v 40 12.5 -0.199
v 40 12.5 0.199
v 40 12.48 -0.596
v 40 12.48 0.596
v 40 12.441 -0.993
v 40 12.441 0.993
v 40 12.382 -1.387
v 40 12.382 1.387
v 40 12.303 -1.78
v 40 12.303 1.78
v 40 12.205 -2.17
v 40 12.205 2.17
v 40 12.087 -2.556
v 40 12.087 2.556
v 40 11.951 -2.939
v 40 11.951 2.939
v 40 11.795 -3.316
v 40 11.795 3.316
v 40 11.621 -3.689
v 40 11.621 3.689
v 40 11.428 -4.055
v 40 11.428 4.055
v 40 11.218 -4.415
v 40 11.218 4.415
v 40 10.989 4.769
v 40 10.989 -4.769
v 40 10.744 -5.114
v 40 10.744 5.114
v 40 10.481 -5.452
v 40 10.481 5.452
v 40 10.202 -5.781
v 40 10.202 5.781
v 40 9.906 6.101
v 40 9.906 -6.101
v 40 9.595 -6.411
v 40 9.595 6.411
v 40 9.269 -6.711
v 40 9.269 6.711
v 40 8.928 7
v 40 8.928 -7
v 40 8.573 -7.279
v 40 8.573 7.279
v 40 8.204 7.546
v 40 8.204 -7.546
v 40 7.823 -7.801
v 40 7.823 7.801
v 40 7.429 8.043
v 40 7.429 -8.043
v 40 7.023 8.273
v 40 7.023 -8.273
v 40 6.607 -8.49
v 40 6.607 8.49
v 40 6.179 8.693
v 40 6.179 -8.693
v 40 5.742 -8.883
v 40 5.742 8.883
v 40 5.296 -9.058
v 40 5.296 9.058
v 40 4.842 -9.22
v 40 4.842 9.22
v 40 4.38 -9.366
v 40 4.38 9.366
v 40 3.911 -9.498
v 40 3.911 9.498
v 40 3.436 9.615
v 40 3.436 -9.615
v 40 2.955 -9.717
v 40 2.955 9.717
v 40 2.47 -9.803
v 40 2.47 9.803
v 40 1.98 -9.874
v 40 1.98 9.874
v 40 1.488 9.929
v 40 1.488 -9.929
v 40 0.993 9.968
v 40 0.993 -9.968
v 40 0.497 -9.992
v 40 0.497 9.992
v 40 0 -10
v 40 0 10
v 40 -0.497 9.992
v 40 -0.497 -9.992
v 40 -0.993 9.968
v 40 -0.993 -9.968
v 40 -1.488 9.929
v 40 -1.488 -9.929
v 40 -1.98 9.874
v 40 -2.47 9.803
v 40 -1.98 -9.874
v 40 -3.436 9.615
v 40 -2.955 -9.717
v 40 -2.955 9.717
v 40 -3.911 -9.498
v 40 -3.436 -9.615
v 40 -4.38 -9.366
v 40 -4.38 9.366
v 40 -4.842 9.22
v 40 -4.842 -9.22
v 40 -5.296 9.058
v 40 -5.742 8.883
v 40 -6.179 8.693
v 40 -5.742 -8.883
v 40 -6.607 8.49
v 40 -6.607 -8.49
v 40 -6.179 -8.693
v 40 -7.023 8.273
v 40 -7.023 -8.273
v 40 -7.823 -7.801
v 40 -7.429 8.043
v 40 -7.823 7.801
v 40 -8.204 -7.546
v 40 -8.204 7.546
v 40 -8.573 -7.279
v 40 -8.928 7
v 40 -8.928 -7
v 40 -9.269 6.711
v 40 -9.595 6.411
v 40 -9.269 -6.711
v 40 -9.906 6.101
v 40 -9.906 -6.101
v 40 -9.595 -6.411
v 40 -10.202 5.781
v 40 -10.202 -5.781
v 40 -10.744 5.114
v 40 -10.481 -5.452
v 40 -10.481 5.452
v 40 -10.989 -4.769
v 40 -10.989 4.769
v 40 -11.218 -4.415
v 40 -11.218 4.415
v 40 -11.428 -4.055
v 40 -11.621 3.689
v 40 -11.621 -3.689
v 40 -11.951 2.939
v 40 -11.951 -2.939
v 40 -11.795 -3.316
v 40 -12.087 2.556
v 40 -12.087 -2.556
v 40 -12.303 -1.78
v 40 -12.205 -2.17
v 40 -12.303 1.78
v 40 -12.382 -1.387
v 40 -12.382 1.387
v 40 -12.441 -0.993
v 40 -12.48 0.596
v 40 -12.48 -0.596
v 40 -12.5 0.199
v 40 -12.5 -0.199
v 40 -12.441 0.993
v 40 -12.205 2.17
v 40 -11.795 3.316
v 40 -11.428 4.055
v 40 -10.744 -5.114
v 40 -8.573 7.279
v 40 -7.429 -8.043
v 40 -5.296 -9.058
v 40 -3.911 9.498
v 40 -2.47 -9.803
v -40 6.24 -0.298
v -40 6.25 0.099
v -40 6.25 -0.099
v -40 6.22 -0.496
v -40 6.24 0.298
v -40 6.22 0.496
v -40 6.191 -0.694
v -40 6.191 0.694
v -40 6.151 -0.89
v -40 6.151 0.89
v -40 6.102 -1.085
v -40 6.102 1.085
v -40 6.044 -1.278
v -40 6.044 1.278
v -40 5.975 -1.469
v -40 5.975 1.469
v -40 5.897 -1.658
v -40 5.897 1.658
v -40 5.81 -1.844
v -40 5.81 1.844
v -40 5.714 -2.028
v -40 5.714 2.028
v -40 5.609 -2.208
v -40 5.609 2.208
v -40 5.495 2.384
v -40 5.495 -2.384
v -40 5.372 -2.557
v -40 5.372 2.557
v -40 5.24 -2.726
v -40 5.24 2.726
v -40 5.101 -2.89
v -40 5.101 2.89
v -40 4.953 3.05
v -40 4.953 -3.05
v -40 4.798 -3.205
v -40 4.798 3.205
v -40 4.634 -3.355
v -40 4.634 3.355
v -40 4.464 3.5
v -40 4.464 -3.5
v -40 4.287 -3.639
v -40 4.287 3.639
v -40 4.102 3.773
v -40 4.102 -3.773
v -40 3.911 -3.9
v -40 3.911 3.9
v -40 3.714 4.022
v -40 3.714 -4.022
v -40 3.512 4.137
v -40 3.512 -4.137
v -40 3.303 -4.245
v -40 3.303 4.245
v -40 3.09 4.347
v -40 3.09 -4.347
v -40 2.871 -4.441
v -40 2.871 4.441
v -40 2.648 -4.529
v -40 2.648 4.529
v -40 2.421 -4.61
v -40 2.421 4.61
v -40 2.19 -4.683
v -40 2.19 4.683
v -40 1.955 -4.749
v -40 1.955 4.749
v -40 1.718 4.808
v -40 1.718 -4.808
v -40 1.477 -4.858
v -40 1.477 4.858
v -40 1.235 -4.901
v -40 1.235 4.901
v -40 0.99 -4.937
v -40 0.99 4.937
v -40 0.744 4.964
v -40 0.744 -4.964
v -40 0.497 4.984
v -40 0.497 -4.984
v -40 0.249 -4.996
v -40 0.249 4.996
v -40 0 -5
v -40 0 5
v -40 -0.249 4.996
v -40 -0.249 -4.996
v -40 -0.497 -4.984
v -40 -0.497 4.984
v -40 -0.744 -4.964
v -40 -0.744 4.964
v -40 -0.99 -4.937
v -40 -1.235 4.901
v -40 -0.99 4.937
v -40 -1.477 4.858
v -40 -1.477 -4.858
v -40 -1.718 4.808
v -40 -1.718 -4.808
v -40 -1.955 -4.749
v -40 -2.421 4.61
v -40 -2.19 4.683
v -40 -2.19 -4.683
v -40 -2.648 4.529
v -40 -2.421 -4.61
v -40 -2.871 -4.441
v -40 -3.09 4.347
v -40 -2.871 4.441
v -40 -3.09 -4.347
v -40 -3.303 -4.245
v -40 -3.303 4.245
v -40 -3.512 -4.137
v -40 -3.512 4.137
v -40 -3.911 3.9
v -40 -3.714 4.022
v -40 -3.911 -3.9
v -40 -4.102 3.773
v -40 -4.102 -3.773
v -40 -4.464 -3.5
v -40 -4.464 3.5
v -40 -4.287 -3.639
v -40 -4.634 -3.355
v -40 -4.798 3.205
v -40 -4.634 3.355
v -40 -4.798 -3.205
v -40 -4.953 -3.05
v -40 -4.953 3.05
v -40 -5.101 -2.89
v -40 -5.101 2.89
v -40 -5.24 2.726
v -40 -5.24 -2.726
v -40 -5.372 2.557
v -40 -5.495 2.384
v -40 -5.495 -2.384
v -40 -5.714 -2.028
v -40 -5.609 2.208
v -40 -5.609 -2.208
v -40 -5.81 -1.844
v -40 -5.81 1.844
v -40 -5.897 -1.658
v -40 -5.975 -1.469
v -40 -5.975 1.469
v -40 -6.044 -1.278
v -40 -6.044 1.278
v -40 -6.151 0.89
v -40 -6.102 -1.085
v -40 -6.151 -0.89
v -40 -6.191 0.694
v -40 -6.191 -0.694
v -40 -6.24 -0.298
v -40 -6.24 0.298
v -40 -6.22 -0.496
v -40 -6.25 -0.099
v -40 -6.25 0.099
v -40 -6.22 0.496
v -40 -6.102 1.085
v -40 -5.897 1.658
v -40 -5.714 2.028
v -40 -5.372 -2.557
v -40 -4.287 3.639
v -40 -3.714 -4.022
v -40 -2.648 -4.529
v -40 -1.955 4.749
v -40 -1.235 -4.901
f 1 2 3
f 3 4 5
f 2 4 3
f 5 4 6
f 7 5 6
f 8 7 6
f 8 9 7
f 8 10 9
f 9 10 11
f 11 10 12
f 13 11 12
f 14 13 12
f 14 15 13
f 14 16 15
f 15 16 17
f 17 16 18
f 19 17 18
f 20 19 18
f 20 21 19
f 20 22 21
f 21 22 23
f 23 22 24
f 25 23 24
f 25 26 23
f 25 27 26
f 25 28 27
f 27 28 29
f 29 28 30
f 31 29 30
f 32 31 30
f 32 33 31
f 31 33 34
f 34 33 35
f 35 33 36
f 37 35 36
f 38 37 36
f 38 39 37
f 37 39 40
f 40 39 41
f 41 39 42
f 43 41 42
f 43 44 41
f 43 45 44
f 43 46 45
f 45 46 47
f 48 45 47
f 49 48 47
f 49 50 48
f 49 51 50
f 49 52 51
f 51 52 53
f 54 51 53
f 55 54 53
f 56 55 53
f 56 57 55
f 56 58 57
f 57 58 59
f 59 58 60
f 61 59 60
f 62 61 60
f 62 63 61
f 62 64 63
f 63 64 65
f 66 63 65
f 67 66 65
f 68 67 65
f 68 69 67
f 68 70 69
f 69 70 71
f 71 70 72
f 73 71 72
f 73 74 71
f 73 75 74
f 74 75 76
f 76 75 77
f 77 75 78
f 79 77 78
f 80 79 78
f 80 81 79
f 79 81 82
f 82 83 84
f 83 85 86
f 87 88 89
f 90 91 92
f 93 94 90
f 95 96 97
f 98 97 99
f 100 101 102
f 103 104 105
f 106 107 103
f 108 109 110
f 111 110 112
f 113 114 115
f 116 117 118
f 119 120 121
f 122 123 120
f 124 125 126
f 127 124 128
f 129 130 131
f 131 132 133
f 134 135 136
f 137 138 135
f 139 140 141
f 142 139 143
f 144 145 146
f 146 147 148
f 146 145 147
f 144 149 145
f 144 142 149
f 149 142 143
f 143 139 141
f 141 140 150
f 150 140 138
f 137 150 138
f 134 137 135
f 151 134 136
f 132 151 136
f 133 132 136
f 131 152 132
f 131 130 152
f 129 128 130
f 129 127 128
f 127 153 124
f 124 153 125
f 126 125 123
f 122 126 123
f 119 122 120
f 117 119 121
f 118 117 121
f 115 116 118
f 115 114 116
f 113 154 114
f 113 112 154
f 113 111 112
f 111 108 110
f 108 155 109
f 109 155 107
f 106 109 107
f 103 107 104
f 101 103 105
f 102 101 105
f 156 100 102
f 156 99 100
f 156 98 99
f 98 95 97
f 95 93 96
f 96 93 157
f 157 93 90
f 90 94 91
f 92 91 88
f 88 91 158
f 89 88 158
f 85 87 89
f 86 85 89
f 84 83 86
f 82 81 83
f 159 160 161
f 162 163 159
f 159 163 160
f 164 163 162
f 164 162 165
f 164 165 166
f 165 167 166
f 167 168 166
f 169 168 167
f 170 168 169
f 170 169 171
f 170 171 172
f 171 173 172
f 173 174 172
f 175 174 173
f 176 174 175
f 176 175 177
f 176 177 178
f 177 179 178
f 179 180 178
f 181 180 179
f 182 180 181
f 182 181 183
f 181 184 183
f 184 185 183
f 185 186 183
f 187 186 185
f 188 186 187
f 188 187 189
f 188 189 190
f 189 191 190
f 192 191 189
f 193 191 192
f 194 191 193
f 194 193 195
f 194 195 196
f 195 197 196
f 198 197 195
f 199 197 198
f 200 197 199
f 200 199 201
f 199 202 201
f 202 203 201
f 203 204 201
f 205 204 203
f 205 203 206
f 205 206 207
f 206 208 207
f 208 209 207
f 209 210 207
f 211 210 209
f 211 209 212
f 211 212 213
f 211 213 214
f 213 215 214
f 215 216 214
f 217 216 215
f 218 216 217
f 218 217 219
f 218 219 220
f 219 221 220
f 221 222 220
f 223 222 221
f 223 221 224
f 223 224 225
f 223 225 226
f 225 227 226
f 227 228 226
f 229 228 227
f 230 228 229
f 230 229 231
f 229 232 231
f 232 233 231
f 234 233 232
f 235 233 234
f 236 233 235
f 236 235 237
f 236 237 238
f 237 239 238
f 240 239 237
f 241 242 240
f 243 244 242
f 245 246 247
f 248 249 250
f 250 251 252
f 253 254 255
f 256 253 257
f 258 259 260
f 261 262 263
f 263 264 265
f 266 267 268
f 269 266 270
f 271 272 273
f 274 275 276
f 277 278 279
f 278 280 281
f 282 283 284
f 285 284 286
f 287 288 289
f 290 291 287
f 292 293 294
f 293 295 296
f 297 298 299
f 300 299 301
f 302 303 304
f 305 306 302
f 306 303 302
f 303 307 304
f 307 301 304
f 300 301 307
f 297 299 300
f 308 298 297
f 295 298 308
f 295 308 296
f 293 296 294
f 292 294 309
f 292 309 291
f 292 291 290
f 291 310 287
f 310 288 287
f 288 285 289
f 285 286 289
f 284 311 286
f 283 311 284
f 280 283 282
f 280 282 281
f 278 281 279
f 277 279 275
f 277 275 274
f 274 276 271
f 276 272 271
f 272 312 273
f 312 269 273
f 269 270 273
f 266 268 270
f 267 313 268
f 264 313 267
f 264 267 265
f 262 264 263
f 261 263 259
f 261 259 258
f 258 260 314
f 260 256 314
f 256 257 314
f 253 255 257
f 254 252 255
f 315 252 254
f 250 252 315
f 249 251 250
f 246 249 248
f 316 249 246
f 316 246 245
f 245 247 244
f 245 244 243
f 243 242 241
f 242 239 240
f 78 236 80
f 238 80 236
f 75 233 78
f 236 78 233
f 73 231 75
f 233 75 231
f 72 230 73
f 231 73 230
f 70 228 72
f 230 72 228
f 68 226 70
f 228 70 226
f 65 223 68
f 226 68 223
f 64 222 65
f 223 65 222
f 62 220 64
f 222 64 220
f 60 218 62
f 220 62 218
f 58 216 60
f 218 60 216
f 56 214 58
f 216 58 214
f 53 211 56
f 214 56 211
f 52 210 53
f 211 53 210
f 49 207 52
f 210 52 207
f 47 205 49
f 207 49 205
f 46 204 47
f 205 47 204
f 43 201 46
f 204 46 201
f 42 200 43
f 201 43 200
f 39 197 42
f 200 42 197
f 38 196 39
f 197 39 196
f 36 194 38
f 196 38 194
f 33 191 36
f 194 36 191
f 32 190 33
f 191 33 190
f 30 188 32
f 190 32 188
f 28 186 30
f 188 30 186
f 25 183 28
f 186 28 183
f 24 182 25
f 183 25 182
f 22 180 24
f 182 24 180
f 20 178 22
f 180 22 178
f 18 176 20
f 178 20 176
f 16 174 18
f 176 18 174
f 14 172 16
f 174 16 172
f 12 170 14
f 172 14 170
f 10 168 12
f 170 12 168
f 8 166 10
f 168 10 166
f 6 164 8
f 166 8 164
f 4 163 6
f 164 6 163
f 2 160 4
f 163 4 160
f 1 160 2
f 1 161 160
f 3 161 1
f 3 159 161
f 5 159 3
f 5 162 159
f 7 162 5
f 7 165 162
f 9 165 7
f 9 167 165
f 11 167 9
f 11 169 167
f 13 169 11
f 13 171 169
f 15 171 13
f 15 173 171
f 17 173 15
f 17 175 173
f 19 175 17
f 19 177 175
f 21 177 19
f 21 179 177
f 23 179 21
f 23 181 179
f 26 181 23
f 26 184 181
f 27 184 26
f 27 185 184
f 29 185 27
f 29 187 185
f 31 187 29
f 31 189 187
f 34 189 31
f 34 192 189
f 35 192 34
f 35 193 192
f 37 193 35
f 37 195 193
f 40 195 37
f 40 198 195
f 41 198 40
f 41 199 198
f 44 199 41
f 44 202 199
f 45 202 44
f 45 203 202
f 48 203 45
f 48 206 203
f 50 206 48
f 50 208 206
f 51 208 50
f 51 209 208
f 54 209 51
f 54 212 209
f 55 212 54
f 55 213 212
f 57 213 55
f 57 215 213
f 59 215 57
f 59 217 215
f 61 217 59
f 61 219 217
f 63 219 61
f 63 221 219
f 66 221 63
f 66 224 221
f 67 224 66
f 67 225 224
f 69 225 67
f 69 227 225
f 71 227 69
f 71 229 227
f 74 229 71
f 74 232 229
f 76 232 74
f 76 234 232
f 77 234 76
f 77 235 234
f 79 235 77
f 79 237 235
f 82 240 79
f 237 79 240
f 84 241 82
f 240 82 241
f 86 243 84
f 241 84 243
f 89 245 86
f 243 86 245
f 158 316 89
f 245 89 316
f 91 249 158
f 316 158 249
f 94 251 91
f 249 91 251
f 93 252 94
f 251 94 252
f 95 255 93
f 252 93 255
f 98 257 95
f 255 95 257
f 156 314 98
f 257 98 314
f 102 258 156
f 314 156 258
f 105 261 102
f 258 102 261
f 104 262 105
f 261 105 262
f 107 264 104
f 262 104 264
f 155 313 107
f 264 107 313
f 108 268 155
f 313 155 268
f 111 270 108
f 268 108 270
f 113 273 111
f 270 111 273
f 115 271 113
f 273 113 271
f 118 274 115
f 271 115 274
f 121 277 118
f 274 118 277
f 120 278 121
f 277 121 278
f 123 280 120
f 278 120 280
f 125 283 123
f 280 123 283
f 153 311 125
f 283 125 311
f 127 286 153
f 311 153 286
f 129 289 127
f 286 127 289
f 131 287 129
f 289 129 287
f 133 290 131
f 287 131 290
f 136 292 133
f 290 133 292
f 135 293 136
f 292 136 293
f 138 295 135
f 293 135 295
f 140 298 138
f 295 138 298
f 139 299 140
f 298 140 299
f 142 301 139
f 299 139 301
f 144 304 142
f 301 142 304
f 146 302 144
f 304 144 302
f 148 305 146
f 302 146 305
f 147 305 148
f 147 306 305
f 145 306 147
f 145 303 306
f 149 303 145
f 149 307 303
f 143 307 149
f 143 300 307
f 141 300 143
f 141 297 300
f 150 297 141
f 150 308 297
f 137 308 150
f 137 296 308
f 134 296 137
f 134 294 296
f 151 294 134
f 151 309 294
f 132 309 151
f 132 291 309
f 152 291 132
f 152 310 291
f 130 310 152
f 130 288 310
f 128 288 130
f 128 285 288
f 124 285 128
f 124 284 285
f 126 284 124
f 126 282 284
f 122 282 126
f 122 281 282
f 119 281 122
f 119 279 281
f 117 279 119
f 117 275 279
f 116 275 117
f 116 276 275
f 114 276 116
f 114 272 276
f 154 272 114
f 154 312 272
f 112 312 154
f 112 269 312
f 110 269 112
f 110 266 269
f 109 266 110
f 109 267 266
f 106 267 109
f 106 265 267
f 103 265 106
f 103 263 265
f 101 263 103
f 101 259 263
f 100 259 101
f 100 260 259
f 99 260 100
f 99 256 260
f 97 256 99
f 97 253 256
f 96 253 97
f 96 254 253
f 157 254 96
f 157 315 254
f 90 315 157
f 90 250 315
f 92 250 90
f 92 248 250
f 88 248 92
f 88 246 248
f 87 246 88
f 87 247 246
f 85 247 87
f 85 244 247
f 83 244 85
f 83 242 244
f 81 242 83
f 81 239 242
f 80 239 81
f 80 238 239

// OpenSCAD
module rounded_car_body(length=80, rear_height=20, rear_width=25, scaling_factor=0.5) {
    rotate([0,-90,0])
        linear_extrude(height=length,center=true,scale=scaling_factor)
        resize([rear_height,rear_width])
        circle(d=rear_height);    
}

$fa = 1;
$fs = 0.4;
rounded_car_body();
